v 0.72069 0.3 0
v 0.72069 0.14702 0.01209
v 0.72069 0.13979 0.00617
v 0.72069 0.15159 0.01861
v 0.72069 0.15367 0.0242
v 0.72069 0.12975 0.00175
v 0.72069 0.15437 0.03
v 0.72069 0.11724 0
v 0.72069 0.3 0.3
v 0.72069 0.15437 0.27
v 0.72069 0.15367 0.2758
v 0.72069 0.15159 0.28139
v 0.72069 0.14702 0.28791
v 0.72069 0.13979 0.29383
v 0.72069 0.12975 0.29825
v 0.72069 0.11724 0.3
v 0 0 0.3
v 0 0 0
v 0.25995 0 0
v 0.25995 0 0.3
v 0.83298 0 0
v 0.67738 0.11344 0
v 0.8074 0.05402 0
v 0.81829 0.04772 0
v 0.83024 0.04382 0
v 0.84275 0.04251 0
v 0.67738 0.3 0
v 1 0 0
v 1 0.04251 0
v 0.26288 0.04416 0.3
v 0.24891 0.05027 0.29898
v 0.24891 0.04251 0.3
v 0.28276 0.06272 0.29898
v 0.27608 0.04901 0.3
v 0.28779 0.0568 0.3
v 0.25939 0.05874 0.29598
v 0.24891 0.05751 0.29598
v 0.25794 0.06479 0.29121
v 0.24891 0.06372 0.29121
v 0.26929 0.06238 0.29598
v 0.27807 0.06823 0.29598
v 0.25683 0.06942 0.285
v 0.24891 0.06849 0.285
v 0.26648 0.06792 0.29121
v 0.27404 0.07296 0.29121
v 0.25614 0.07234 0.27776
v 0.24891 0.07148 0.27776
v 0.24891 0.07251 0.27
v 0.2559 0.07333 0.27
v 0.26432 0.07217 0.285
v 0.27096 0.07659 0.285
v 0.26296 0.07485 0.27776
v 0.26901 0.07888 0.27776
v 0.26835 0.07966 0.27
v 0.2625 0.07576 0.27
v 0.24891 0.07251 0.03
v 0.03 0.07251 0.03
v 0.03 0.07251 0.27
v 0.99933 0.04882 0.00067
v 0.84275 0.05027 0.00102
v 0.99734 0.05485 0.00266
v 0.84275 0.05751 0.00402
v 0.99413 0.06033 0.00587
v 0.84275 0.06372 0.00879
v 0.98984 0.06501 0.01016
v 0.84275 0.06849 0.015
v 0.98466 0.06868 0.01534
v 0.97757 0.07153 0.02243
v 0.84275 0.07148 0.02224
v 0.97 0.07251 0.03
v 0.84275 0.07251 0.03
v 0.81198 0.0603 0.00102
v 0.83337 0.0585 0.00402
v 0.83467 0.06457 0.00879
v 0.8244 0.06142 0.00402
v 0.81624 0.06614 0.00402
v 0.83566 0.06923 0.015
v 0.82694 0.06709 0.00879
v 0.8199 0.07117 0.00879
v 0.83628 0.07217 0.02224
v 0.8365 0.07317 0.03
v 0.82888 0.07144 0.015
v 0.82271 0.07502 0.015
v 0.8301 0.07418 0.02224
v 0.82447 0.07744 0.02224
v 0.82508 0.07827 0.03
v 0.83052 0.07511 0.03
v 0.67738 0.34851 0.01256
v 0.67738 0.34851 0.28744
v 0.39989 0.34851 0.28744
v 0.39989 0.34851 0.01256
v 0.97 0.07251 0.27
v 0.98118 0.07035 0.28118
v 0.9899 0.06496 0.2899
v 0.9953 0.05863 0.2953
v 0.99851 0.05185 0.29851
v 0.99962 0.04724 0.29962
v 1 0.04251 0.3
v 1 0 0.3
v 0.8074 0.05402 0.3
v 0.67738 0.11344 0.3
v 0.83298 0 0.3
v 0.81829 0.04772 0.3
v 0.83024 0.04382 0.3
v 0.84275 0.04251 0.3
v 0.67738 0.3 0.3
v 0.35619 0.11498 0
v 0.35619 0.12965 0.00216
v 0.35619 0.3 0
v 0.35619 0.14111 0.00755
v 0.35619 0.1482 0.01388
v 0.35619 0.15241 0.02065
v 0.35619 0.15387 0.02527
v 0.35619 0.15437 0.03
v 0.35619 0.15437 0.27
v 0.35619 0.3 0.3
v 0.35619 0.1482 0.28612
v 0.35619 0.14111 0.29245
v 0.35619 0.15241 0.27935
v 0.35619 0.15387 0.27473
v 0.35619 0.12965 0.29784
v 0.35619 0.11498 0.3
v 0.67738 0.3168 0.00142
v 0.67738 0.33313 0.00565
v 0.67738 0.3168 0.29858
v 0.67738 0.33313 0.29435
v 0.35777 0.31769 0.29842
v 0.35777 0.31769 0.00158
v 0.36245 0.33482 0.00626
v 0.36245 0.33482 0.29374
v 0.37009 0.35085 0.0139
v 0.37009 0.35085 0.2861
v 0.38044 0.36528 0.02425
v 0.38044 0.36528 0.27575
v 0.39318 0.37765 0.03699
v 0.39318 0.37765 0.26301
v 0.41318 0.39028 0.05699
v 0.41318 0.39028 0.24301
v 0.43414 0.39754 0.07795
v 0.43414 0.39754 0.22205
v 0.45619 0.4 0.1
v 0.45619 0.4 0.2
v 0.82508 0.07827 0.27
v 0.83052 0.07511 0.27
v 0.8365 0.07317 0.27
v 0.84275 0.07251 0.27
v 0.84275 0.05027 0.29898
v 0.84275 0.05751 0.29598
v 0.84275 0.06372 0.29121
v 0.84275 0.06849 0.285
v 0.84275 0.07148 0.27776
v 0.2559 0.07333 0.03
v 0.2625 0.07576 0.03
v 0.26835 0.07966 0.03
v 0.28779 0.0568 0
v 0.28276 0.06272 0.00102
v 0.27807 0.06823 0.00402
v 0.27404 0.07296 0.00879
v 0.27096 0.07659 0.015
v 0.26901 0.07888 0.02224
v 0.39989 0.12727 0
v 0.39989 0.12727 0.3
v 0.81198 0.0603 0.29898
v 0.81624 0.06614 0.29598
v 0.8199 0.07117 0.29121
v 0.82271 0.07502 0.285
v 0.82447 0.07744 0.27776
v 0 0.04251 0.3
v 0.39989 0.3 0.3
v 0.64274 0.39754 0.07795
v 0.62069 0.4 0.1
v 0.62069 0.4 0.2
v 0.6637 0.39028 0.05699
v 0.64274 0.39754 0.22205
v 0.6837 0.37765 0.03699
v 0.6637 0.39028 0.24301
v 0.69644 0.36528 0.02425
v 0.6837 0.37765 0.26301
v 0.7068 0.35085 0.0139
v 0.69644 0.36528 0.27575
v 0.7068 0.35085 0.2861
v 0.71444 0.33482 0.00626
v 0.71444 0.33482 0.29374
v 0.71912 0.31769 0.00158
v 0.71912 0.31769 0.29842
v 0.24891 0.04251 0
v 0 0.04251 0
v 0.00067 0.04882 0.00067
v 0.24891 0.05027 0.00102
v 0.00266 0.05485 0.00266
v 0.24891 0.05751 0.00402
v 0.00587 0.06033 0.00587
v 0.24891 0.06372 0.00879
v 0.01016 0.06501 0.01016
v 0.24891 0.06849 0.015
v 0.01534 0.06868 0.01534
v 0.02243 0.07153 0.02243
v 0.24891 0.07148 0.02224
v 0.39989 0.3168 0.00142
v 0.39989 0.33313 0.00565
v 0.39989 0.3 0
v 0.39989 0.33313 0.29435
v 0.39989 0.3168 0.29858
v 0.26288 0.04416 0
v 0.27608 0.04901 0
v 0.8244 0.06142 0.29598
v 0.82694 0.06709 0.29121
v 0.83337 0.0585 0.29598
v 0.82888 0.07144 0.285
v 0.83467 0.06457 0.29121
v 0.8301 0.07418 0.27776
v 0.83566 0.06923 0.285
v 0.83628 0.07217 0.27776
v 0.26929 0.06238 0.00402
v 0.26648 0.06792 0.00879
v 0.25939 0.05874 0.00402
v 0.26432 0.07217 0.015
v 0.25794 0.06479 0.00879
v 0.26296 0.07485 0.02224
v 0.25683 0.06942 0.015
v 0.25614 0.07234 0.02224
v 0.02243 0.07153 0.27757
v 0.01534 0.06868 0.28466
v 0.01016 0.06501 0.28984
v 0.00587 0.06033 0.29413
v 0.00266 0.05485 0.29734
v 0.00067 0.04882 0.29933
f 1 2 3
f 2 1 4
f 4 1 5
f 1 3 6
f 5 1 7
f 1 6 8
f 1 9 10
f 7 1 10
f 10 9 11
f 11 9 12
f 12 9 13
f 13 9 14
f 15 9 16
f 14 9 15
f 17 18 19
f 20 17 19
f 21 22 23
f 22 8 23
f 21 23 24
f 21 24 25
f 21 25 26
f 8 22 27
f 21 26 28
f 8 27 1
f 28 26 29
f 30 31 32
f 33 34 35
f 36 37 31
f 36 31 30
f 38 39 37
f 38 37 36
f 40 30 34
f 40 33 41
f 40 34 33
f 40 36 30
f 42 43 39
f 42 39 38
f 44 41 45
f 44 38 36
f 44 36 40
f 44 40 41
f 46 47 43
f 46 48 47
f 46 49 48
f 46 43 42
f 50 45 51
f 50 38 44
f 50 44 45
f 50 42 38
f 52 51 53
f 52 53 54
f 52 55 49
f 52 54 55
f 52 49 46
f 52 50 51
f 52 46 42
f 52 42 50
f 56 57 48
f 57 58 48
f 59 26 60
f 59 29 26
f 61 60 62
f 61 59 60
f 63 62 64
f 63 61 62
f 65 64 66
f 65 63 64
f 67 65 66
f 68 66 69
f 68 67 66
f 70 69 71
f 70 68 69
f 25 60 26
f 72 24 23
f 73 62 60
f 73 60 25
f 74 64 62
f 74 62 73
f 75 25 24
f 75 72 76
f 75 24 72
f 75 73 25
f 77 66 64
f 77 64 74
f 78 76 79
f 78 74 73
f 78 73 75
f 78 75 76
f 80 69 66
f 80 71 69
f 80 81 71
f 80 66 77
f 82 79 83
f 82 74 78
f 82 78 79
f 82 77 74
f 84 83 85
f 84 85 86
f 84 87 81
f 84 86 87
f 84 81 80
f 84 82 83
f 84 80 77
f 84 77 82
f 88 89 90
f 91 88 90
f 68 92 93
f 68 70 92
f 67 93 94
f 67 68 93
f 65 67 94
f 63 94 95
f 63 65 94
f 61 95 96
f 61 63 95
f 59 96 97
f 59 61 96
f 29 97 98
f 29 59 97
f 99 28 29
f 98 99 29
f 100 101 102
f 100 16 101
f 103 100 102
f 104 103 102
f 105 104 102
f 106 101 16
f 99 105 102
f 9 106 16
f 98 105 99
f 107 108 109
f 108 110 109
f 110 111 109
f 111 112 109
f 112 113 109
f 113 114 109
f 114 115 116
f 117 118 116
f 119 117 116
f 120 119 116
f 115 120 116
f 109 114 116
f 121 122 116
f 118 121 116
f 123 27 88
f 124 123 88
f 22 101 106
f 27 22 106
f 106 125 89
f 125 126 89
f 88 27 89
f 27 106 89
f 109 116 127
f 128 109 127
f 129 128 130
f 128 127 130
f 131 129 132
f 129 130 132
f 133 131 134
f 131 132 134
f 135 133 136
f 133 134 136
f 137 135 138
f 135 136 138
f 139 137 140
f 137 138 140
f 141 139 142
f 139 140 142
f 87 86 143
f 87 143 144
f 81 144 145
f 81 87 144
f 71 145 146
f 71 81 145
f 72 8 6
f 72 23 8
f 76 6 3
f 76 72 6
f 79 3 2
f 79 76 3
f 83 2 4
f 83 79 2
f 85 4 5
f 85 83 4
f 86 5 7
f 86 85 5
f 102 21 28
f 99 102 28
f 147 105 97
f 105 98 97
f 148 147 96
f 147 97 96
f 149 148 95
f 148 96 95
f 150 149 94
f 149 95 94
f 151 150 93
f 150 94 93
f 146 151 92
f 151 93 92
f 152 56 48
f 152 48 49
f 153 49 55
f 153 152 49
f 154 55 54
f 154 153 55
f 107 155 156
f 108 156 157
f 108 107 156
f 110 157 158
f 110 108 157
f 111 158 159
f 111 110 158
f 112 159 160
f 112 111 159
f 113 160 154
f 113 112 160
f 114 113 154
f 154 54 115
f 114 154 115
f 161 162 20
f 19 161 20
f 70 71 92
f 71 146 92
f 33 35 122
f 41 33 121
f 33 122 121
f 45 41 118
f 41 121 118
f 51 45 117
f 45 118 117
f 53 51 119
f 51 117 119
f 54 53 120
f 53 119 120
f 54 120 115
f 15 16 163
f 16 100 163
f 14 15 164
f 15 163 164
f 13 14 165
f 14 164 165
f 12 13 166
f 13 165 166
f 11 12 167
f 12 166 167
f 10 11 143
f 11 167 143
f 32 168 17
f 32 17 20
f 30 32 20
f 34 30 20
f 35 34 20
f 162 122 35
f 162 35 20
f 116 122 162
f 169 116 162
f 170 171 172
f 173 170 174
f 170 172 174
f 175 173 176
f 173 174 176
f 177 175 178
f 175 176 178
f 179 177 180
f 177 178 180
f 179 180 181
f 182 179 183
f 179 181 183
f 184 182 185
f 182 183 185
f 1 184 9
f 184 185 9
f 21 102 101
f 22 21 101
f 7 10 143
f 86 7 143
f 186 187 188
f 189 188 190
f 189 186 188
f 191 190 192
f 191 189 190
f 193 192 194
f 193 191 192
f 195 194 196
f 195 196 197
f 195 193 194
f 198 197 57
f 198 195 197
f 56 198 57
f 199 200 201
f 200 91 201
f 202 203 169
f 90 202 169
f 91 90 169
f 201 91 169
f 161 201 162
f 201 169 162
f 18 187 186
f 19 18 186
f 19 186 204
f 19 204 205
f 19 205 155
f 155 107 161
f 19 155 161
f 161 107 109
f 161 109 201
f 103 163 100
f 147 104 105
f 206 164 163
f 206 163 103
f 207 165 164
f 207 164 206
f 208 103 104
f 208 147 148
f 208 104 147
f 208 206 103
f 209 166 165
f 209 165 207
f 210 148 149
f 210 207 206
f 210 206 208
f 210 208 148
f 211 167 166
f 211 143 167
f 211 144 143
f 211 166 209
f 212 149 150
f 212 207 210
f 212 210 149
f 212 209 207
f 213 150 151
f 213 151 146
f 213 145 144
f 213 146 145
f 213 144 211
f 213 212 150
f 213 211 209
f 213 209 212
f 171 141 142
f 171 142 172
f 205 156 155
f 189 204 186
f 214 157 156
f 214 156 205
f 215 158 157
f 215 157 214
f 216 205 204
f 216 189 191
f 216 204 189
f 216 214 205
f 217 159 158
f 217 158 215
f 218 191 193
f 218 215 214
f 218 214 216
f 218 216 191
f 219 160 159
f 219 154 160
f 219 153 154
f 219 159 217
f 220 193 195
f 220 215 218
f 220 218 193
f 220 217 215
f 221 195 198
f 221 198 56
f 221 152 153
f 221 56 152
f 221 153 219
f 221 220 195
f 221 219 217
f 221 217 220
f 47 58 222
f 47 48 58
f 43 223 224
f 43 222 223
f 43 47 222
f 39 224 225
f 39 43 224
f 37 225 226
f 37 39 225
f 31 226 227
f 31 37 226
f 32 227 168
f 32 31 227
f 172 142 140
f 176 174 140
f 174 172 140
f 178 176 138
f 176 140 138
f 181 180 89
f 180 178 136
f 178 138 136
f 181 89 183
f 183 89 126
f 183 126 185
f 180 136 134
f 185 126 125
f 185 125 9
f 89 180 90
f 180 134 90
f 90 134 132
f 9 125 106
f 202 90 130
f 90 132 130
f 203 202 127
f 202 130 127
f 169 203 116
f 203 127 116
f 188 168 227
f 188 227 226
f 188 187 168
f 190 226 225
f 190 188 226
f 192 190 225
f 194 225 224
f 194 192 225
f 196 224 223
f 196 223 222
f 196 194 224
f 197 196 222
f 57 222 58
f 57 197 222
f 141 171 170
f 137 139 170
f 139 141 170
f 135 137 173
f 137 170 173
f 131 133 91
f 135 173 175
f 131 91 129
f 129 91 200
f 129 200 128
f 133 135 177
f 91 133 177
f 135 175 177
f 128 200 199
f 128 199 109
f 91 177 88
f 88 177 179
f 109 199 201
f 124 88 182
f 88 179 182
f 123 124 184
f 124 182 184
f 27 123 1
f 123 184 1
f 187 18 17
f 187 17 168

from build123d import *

# Parameters (mm, degrees)
SKETCH_1_W          = 1
SKETCH_1_H          = 0.4
EXTRUDE_1_DEPTH     = 0.3
SKETCH_2_OUTSIDE_W  = 3.224
SKETCH_2_OUTSIDE_H  = 2.624
CUT_EXTRUDE_1_DEPTH = 0.7
FILLET_1_R          = 0.1
FILLET_2_R          = 0.03


with BuildPart() as part:
    # 草图1 → 凸台-拉伸1 (new body)
    with BuildSketch(Plane.XY):
        with Locations((0.5, 0.2)):
            Rectangle(SKETCH_1_W, SKETCH_1_H)
    extrude(amount=EXTRUDE_1_DEPTH)

    # 草图2 outside → 切除-拉伸1 (cut)
    with BuildSketch(Plane.XY.offset(0.3)):
        with Locations((0.5, 0.2)):
            Rectangle(SKETCH_2_OUTSIDE_W, SKETCH_2_OUTSIDE_H)
        Polygon((0, 0.072506772), (0.259947675, 0.072506772), (0.356189851, 0.154367934), (0.356189851, 0.4), (0.720693267, 0.4), (0.720693267, 0.154367934), (0.832975806, 0.072506772), (1, 0.072506772), (1, 0), (0.832975806, 0), (0.67738268, 0.113437353), (0.67738268, 0.348511634), (0.399886012, 0.348511634), (0.399886012, 0.127265252), (0.259947675, 0), (0, 0), align=None, mode=Mode.SUBTRACT)
    extrude(amount=-CUT_EXTRUDE_1_DEPTH, mode=Mode.SUBTRACT)

    # 圆角1
    # the kernel refuses this fillet: 0.1 mm, written as the material it takes off along each edge
    with BuildSketch(Plane(origin=(0.970693267, 0.4, 0), x_dir=(0, -1, 0), z_dir=(-1, 0, 0)), Plane(origin=(0.106189851, 0.4, 0.3), x_dir=(0, -1, 0), z_dir=(1, 0, 0))) as fillet_1_piece_1:
        with BuildLine():
            CenterArc((FILLET_1_R, FILLET_1_R), FILLET_1_R, 180, 90)
            Line((0, FILLET_1_R), (0, 0))
            Line((0, 0), (FILLET_1_R, 0))
        make_face()
    extrude(amount=0.864503415, mode=Mode.SUBTRACT)
    with BuildSketch(Plane(origin=(0.720693267, 0.4, 0.55), x_dir=(-1, 0, 0), z_dir=(0, 0, -1)), Plane(origin=(0.356189851, 0.4, 0.55), x_dir=(0, -1, 0), z_dir=(0, 0, -1))) as fillet_1_piece_2:
        with BuildLine():
            CenterArc((FILLET_1_R, -FILLET_1_R), FILLET_1_R, 90, 90)
            Line((0, -FILLET_1_R), (0, 0))
            Line((0, 0), (FILLET_1_R, 0))
        make_face()
    extrude(amount=0.8, mode=Mode.SUBTRACT)

    # 圆角2
    fillet_2_edges = [part.edges().sort_by_distance(p)[0] for p in [
        (0.916487903, 0.072506772, 0),
        (0.776834536, 0.113437353, 0),
        (0.308068763, 0.113437353, 0),
        (0.129973837, 0.072506772, 0),
        (0, 0.072506772, 0.15),
        (0.259947675, 0.072506772, 0.15),
        (0.129973837, 0.072506772, 0.3),
        (0.308068763, 0.113437353, 0.3),
        (0.832975806, 0.072506772, 0.15),
        (0.776834536, 0.113437353, 0.3),
        (1, 0.072506772, 0.15),
        (0.916487903, 0.072506772, 0.3),
    ]]
    fillet(fillet_2_edges, radius=FILLET_2_R)


solid = part.part
